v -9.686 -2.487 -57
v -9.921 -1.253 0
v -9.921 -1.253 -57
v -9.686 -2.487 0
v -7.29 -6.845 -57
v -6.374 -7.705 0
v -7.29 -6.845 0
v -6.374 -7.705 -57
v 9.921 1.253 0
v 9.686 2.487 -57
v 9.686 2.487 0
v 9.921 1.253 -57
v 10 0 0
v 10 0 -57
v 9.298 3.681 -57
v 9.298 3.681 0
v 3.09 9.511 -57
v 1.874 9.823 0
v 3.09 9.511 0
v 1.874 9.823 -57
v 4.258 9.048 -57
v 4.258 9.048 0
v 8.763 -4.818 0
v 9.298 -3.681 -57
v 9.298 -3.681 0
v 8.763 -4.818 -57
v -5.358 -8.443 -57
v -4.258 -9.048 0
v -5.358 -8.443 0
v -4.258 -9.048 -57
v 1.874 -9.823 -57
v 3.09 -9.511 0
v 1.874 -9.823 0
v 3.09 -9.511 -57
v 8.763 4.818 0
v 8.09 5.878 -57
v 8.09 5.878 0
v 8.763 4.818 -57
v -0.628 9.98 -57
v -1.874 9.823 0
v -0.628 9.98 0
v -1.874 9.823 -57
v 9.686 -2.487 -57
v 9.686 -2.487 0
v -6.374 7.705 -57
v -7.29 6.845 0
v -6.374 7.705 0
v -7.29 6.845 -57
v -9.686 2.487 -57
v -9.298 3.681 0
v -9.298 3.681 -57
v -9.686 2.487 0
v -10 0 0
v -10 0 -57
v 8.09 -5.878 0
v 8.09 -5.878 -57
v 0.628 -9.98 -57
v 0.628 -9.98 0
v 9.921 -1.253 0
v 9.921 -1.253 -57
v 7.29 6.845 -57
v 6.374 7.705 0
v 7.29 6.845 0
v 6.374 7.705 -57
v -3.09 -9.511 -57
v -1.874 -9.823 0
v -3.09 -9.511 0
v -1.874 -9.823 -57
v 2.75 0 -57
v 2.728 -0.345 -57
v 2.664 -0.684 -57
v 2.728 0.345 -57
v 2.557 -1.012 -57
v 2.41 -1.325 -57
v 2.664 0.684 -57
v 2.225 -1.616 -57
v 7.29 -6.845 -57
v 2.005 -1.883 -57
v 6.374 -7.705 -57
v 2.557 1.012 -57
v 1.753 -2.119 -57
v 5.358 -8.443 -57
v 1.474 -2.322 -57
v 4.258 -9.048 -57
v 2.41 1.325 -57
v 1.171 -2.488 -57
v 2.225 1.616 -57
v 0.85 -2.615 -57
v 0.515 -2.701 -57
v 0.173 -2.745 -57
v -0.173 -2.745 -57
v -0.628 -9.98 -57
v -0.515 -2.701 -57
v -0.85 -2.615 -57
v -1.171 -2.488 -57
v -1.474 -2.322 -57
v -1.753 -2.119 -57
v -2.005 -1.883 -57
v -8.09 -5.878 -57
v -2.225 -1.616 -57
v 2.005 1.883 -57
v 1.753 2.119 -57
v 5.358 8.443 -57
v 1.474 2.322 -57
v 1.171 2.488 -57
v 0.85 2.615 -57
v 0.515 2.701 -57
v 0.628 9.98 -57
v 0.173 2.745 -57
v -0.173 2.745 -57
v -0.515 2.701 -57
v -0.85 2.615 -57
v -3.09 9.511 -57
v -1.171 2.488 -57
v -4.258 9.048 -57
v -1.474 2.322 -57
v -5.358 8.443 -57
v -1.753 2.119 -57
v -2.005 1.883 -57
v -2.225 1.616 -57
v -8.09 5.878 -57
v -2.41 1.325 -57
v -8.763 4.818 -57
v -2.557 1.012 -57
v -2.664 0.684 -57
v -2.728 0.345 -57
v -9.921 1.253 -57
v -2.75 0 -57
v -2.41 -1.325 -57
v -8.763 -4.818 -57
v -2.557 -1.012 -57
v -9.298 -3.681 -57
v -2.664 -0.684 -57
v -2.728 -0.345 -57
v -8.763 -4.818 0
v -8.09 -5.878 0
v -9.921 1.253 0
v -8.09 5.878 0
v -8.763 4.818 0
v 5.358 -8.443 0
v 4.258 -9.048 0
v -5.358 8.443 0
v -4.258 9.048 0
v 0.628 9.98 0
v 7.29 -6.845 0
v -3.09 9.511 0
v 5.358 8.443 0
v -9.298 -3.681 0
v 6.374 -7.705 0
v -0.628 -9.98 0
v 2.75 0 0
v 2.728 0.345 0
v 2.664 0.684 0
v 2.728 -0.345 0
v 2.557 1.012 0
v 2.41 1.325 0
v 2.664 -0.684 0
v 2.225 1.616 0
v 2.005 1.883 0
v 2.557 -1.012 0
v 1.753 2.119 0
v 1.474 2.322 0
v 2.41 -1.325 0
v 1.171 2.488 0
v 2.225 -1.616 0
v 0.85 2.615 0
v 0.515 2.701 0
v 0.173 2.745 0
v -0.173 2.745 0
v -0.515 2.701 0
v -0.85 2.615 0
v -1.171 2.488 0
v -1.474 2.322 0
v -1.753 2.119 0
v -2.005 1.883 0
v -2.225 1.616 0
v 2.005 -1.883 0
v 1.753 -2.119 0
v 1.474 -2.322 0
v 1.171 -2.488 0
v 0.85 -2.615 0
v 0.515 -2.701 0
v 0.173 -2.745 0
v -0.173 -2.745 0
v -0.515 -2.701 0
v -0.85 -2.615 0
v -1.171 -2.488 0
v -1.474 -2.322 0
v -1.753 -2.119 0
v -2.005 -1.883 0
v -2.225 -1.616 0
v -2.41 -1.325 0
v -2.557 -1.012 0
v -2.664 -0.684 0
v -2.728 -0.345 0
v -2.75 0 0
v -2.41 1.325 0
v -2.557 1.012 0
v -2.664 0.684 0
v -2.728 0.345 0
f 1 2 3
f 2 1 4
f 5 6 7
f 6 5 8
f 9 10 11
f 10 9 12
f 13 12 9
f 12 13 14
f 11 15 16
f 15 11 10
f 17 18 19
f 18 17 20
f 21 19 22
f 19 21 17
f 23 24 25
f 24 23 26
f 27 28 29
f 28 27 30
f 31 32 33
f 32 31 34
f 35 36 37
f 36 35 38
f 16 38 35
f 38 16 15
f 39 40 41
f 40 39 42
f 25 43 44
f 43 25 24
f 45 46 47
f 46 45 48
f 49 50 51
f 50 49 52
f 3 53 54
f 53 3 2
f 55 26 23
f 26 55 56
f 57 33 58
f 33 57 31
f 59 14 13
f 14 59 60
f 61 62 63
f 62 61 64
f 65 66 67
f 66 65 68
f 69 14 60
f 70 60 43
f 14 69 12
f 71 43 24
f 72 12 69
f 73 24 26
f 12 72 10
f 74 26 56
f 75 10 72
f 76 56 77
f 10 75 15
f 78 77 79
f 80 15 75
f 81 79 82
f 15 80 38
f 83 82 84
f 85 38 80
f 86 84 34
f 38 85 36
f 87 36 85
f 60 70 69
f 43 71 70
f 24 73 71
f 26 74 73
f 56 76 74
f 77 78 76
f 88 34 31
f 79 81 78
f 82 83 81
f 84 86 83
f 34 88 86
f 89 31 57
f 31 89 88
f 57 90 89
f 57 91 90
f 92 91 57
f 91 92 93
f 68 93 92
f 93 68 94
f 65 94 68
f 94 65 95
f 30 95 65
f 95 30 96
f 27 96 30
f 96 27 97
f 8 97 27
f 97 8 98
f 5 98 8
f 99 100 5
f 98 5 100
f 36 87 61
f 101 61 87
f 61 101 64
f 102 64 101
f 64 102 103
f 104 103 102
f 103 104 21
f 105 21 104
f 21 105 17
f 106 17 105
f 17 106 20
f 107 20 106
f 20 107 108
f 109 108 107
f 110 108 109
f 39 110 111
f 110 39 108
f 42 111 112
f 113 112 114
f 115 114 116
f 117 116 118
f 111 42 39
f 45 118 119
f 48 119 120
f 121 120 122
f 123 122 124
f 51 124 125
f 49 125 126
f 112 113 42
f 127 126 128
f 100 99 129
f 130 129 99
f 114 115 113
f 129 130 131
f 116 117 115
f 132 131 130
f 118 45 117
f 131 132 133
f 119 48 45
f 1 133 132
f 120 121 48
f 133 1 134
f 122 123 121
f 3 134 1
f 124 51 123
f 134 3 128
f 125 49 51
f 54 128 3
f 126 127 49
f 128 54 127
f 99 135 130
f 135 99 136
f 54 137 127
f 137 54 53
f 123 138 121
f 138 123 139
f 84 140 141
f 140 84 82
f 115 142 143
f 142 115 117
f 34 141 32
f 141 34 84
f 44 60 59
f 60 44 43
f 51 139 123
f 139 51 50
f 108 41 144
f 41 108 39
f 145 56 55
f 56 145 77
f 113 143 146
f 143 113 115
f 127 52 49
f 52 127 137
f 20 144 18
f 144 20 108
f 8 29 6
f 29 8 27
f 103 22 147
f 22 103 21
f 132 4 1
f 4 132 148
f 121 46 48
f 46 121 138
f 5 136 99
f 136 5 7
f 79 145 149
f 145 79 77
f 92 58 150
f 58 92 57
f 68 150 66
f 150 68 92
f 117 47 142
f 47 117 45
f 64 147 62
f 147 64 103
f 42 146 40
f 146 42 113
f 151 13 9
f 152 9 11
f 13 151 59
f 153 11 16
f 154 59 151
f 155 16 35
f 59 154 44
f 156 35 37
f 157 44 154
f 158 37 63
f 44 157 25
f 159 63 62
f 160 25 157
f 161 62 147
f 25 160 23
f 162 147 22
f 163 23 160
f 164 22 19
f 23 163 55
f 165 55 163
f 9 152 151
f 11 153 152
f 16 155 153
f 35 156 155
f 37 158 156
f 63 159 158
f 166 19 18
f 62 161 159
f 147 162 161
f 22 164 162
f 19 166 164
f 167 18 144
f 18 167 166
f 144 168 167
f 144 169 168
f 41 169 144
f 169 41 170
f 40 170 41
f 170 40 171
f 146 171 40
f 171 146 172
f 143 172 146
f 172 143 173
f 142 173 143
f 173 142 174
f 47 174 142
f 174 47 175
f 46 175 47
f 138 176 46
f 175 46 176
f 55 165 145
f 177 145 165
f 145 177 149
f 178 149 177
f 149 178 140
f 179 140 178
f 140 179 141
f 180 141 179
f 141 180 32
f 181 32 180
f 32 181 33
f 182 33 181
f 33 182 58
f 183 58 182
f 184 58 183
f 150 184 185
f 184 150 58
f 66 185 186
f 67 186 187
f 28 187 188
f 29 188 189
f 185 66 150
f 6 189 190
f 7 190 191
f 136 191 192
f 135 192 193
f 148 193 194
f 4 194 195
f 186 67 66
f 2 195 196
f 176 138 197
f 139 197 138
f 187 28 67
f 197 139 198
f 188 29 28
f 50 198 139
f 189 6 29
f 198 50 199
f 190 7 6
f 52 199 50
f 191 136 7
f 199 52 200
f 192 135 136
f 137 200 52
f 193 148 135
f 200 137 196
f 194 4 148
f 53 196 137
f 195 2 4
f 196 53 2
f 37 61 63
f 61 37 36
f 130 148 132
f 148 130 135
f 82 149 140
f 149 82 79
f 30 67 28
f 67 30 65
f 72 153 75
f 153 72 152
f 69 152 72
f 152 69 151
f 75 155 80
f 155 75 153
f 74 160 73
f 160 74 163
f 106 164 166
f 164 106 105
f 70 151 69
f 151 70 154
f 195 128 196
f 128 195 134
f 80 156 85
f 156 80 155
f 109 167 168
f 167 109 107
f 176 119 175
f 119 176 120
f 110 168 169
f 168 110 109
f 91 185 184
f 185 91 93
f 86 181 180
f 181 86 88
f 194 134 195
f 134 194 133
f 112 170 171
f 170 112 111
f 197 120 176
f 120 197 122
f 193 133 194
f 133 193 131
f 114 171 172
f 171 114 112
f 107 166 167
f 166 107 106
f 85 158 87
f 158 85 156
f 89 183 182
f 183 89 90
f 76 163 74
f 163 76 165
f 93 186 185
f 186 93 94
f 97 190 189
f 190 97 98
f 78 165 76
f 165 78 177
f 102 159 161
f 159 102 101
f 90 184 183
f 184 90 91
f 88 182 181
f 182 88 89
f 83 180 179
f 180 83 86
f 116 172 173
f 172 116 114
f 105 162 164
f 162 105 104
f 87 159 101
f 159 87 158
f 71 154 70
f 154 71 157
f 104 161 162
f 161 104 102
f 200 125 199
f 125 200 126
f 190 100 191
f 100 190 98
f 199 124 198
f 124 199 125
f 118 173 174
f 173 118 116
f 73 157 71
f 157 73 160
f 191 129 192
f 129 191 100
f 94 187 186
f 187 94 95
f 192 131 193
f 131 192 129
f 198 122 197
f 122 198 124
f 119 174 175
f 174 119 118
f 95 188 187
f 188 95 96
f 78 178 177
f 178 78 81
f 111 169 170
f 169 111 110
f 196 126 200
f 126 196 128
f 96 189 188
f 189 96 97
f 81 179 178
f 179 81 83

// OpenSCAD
$fn = 50;


difference() {
	union() {
		translate(v = [0, 0, -57.0000000000]) {
			cylinder(h = 57, r = 10.0000000000);
		}
		cylinder(h = 0, r = 19.0000000000);
	}
	union() {
		#translate(v = [0, 0, -57]) {
			cylinder(h = 57, r = 2.7500000000);
		}
	}
}
